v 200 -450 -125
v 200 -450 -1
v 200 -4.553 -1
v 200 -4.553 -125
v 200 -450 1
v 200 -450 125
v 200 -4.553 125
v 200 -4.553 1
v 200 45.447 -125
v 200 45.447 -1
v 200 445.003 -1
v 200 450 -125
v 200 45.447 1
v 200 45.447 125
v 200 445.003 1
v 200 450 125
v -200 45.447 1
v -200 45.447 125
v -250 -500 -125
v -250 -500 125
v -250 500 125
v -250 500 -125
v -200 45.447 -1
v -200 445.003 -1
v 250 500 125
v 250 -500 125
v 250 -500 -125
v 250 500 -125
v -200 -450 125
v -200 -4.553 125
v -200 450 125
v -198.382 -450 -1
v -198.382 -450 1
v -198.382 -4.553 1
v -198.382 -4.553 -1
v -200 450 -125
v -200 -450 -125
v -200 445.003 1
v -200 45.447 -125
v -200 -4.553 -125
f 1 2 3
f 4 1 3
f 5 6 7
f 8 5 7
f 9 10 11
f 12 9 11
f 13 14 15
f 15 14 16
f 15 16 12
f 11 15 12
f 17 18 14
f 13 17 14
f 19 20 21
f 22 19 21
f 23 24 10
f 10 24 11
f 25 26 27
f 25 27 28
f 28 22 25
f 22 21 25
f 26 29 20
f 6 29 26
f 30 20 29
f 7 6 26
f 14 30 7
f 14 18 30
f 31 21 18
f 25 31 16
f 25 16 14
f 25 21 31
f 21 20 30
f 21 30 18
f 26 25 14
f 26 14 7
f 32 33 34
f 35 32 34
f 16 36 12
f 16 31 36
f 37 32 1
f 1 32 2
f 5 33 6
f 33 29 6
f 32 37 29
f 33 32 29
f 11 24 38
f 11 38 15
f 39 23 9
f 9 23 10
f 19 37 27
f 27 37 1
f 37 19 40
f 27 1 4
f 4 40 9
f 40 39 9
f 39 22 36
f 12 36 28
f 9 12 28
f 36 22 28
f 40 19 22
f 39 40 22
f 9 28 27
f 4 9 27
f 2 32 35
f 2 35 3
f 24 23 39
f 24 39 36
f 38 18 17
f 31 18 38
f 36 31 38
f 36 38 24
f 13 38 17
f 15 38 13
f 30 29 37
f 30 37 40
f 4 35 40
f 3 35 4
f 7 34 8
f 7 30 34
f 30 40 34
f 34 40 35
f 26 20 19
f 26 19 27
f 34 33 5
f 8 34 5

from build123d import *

# Parameters (mm, degrees)
F0_W     = 500
F0_H     = 1000
F0_W_2   = 400
F0_H_2   = 445.4466052353
F0_H_3   = 404.5533947647
F1_DEPTH = 125
F2_W     = 401.6181921197
F2_H     = 400
F2_W_2   = 400
F2_H_2   = 450
F3_DEPTH = 1


with BuildPart() as f1:
    # F0 (on Top) → F1 (new body, symmetric)
    with BuildSketch(Plane.XY):
        Rectangle(F0_W, F0_H)
        with Locations((0, -227.2766973823)):
            Rectangle(F0_W_2, F0_H_2, mode=Mode.SUBTRACT)
        with Locations((0, 247.7233026177)):
            Rectangle(F0_W_2, F0_H_3, mode=Mode.SUBTRACT)
    extrude(amount=F1_DEPTH, both=True)

    # F2 (on Top) → F3 (join, symmetric)
    with BuildSketch(Plane.XY):
        with Locations((0.8090960599, 245.0032802157)):
            Rectangle(F2_W, F2_H)
        with Locations((1.6181921197, -225)):
            Rectangle(F2_W_2, F2_H_2)
    extrude(amount=F3_DEPTH, both=True)


solid = f1.part
